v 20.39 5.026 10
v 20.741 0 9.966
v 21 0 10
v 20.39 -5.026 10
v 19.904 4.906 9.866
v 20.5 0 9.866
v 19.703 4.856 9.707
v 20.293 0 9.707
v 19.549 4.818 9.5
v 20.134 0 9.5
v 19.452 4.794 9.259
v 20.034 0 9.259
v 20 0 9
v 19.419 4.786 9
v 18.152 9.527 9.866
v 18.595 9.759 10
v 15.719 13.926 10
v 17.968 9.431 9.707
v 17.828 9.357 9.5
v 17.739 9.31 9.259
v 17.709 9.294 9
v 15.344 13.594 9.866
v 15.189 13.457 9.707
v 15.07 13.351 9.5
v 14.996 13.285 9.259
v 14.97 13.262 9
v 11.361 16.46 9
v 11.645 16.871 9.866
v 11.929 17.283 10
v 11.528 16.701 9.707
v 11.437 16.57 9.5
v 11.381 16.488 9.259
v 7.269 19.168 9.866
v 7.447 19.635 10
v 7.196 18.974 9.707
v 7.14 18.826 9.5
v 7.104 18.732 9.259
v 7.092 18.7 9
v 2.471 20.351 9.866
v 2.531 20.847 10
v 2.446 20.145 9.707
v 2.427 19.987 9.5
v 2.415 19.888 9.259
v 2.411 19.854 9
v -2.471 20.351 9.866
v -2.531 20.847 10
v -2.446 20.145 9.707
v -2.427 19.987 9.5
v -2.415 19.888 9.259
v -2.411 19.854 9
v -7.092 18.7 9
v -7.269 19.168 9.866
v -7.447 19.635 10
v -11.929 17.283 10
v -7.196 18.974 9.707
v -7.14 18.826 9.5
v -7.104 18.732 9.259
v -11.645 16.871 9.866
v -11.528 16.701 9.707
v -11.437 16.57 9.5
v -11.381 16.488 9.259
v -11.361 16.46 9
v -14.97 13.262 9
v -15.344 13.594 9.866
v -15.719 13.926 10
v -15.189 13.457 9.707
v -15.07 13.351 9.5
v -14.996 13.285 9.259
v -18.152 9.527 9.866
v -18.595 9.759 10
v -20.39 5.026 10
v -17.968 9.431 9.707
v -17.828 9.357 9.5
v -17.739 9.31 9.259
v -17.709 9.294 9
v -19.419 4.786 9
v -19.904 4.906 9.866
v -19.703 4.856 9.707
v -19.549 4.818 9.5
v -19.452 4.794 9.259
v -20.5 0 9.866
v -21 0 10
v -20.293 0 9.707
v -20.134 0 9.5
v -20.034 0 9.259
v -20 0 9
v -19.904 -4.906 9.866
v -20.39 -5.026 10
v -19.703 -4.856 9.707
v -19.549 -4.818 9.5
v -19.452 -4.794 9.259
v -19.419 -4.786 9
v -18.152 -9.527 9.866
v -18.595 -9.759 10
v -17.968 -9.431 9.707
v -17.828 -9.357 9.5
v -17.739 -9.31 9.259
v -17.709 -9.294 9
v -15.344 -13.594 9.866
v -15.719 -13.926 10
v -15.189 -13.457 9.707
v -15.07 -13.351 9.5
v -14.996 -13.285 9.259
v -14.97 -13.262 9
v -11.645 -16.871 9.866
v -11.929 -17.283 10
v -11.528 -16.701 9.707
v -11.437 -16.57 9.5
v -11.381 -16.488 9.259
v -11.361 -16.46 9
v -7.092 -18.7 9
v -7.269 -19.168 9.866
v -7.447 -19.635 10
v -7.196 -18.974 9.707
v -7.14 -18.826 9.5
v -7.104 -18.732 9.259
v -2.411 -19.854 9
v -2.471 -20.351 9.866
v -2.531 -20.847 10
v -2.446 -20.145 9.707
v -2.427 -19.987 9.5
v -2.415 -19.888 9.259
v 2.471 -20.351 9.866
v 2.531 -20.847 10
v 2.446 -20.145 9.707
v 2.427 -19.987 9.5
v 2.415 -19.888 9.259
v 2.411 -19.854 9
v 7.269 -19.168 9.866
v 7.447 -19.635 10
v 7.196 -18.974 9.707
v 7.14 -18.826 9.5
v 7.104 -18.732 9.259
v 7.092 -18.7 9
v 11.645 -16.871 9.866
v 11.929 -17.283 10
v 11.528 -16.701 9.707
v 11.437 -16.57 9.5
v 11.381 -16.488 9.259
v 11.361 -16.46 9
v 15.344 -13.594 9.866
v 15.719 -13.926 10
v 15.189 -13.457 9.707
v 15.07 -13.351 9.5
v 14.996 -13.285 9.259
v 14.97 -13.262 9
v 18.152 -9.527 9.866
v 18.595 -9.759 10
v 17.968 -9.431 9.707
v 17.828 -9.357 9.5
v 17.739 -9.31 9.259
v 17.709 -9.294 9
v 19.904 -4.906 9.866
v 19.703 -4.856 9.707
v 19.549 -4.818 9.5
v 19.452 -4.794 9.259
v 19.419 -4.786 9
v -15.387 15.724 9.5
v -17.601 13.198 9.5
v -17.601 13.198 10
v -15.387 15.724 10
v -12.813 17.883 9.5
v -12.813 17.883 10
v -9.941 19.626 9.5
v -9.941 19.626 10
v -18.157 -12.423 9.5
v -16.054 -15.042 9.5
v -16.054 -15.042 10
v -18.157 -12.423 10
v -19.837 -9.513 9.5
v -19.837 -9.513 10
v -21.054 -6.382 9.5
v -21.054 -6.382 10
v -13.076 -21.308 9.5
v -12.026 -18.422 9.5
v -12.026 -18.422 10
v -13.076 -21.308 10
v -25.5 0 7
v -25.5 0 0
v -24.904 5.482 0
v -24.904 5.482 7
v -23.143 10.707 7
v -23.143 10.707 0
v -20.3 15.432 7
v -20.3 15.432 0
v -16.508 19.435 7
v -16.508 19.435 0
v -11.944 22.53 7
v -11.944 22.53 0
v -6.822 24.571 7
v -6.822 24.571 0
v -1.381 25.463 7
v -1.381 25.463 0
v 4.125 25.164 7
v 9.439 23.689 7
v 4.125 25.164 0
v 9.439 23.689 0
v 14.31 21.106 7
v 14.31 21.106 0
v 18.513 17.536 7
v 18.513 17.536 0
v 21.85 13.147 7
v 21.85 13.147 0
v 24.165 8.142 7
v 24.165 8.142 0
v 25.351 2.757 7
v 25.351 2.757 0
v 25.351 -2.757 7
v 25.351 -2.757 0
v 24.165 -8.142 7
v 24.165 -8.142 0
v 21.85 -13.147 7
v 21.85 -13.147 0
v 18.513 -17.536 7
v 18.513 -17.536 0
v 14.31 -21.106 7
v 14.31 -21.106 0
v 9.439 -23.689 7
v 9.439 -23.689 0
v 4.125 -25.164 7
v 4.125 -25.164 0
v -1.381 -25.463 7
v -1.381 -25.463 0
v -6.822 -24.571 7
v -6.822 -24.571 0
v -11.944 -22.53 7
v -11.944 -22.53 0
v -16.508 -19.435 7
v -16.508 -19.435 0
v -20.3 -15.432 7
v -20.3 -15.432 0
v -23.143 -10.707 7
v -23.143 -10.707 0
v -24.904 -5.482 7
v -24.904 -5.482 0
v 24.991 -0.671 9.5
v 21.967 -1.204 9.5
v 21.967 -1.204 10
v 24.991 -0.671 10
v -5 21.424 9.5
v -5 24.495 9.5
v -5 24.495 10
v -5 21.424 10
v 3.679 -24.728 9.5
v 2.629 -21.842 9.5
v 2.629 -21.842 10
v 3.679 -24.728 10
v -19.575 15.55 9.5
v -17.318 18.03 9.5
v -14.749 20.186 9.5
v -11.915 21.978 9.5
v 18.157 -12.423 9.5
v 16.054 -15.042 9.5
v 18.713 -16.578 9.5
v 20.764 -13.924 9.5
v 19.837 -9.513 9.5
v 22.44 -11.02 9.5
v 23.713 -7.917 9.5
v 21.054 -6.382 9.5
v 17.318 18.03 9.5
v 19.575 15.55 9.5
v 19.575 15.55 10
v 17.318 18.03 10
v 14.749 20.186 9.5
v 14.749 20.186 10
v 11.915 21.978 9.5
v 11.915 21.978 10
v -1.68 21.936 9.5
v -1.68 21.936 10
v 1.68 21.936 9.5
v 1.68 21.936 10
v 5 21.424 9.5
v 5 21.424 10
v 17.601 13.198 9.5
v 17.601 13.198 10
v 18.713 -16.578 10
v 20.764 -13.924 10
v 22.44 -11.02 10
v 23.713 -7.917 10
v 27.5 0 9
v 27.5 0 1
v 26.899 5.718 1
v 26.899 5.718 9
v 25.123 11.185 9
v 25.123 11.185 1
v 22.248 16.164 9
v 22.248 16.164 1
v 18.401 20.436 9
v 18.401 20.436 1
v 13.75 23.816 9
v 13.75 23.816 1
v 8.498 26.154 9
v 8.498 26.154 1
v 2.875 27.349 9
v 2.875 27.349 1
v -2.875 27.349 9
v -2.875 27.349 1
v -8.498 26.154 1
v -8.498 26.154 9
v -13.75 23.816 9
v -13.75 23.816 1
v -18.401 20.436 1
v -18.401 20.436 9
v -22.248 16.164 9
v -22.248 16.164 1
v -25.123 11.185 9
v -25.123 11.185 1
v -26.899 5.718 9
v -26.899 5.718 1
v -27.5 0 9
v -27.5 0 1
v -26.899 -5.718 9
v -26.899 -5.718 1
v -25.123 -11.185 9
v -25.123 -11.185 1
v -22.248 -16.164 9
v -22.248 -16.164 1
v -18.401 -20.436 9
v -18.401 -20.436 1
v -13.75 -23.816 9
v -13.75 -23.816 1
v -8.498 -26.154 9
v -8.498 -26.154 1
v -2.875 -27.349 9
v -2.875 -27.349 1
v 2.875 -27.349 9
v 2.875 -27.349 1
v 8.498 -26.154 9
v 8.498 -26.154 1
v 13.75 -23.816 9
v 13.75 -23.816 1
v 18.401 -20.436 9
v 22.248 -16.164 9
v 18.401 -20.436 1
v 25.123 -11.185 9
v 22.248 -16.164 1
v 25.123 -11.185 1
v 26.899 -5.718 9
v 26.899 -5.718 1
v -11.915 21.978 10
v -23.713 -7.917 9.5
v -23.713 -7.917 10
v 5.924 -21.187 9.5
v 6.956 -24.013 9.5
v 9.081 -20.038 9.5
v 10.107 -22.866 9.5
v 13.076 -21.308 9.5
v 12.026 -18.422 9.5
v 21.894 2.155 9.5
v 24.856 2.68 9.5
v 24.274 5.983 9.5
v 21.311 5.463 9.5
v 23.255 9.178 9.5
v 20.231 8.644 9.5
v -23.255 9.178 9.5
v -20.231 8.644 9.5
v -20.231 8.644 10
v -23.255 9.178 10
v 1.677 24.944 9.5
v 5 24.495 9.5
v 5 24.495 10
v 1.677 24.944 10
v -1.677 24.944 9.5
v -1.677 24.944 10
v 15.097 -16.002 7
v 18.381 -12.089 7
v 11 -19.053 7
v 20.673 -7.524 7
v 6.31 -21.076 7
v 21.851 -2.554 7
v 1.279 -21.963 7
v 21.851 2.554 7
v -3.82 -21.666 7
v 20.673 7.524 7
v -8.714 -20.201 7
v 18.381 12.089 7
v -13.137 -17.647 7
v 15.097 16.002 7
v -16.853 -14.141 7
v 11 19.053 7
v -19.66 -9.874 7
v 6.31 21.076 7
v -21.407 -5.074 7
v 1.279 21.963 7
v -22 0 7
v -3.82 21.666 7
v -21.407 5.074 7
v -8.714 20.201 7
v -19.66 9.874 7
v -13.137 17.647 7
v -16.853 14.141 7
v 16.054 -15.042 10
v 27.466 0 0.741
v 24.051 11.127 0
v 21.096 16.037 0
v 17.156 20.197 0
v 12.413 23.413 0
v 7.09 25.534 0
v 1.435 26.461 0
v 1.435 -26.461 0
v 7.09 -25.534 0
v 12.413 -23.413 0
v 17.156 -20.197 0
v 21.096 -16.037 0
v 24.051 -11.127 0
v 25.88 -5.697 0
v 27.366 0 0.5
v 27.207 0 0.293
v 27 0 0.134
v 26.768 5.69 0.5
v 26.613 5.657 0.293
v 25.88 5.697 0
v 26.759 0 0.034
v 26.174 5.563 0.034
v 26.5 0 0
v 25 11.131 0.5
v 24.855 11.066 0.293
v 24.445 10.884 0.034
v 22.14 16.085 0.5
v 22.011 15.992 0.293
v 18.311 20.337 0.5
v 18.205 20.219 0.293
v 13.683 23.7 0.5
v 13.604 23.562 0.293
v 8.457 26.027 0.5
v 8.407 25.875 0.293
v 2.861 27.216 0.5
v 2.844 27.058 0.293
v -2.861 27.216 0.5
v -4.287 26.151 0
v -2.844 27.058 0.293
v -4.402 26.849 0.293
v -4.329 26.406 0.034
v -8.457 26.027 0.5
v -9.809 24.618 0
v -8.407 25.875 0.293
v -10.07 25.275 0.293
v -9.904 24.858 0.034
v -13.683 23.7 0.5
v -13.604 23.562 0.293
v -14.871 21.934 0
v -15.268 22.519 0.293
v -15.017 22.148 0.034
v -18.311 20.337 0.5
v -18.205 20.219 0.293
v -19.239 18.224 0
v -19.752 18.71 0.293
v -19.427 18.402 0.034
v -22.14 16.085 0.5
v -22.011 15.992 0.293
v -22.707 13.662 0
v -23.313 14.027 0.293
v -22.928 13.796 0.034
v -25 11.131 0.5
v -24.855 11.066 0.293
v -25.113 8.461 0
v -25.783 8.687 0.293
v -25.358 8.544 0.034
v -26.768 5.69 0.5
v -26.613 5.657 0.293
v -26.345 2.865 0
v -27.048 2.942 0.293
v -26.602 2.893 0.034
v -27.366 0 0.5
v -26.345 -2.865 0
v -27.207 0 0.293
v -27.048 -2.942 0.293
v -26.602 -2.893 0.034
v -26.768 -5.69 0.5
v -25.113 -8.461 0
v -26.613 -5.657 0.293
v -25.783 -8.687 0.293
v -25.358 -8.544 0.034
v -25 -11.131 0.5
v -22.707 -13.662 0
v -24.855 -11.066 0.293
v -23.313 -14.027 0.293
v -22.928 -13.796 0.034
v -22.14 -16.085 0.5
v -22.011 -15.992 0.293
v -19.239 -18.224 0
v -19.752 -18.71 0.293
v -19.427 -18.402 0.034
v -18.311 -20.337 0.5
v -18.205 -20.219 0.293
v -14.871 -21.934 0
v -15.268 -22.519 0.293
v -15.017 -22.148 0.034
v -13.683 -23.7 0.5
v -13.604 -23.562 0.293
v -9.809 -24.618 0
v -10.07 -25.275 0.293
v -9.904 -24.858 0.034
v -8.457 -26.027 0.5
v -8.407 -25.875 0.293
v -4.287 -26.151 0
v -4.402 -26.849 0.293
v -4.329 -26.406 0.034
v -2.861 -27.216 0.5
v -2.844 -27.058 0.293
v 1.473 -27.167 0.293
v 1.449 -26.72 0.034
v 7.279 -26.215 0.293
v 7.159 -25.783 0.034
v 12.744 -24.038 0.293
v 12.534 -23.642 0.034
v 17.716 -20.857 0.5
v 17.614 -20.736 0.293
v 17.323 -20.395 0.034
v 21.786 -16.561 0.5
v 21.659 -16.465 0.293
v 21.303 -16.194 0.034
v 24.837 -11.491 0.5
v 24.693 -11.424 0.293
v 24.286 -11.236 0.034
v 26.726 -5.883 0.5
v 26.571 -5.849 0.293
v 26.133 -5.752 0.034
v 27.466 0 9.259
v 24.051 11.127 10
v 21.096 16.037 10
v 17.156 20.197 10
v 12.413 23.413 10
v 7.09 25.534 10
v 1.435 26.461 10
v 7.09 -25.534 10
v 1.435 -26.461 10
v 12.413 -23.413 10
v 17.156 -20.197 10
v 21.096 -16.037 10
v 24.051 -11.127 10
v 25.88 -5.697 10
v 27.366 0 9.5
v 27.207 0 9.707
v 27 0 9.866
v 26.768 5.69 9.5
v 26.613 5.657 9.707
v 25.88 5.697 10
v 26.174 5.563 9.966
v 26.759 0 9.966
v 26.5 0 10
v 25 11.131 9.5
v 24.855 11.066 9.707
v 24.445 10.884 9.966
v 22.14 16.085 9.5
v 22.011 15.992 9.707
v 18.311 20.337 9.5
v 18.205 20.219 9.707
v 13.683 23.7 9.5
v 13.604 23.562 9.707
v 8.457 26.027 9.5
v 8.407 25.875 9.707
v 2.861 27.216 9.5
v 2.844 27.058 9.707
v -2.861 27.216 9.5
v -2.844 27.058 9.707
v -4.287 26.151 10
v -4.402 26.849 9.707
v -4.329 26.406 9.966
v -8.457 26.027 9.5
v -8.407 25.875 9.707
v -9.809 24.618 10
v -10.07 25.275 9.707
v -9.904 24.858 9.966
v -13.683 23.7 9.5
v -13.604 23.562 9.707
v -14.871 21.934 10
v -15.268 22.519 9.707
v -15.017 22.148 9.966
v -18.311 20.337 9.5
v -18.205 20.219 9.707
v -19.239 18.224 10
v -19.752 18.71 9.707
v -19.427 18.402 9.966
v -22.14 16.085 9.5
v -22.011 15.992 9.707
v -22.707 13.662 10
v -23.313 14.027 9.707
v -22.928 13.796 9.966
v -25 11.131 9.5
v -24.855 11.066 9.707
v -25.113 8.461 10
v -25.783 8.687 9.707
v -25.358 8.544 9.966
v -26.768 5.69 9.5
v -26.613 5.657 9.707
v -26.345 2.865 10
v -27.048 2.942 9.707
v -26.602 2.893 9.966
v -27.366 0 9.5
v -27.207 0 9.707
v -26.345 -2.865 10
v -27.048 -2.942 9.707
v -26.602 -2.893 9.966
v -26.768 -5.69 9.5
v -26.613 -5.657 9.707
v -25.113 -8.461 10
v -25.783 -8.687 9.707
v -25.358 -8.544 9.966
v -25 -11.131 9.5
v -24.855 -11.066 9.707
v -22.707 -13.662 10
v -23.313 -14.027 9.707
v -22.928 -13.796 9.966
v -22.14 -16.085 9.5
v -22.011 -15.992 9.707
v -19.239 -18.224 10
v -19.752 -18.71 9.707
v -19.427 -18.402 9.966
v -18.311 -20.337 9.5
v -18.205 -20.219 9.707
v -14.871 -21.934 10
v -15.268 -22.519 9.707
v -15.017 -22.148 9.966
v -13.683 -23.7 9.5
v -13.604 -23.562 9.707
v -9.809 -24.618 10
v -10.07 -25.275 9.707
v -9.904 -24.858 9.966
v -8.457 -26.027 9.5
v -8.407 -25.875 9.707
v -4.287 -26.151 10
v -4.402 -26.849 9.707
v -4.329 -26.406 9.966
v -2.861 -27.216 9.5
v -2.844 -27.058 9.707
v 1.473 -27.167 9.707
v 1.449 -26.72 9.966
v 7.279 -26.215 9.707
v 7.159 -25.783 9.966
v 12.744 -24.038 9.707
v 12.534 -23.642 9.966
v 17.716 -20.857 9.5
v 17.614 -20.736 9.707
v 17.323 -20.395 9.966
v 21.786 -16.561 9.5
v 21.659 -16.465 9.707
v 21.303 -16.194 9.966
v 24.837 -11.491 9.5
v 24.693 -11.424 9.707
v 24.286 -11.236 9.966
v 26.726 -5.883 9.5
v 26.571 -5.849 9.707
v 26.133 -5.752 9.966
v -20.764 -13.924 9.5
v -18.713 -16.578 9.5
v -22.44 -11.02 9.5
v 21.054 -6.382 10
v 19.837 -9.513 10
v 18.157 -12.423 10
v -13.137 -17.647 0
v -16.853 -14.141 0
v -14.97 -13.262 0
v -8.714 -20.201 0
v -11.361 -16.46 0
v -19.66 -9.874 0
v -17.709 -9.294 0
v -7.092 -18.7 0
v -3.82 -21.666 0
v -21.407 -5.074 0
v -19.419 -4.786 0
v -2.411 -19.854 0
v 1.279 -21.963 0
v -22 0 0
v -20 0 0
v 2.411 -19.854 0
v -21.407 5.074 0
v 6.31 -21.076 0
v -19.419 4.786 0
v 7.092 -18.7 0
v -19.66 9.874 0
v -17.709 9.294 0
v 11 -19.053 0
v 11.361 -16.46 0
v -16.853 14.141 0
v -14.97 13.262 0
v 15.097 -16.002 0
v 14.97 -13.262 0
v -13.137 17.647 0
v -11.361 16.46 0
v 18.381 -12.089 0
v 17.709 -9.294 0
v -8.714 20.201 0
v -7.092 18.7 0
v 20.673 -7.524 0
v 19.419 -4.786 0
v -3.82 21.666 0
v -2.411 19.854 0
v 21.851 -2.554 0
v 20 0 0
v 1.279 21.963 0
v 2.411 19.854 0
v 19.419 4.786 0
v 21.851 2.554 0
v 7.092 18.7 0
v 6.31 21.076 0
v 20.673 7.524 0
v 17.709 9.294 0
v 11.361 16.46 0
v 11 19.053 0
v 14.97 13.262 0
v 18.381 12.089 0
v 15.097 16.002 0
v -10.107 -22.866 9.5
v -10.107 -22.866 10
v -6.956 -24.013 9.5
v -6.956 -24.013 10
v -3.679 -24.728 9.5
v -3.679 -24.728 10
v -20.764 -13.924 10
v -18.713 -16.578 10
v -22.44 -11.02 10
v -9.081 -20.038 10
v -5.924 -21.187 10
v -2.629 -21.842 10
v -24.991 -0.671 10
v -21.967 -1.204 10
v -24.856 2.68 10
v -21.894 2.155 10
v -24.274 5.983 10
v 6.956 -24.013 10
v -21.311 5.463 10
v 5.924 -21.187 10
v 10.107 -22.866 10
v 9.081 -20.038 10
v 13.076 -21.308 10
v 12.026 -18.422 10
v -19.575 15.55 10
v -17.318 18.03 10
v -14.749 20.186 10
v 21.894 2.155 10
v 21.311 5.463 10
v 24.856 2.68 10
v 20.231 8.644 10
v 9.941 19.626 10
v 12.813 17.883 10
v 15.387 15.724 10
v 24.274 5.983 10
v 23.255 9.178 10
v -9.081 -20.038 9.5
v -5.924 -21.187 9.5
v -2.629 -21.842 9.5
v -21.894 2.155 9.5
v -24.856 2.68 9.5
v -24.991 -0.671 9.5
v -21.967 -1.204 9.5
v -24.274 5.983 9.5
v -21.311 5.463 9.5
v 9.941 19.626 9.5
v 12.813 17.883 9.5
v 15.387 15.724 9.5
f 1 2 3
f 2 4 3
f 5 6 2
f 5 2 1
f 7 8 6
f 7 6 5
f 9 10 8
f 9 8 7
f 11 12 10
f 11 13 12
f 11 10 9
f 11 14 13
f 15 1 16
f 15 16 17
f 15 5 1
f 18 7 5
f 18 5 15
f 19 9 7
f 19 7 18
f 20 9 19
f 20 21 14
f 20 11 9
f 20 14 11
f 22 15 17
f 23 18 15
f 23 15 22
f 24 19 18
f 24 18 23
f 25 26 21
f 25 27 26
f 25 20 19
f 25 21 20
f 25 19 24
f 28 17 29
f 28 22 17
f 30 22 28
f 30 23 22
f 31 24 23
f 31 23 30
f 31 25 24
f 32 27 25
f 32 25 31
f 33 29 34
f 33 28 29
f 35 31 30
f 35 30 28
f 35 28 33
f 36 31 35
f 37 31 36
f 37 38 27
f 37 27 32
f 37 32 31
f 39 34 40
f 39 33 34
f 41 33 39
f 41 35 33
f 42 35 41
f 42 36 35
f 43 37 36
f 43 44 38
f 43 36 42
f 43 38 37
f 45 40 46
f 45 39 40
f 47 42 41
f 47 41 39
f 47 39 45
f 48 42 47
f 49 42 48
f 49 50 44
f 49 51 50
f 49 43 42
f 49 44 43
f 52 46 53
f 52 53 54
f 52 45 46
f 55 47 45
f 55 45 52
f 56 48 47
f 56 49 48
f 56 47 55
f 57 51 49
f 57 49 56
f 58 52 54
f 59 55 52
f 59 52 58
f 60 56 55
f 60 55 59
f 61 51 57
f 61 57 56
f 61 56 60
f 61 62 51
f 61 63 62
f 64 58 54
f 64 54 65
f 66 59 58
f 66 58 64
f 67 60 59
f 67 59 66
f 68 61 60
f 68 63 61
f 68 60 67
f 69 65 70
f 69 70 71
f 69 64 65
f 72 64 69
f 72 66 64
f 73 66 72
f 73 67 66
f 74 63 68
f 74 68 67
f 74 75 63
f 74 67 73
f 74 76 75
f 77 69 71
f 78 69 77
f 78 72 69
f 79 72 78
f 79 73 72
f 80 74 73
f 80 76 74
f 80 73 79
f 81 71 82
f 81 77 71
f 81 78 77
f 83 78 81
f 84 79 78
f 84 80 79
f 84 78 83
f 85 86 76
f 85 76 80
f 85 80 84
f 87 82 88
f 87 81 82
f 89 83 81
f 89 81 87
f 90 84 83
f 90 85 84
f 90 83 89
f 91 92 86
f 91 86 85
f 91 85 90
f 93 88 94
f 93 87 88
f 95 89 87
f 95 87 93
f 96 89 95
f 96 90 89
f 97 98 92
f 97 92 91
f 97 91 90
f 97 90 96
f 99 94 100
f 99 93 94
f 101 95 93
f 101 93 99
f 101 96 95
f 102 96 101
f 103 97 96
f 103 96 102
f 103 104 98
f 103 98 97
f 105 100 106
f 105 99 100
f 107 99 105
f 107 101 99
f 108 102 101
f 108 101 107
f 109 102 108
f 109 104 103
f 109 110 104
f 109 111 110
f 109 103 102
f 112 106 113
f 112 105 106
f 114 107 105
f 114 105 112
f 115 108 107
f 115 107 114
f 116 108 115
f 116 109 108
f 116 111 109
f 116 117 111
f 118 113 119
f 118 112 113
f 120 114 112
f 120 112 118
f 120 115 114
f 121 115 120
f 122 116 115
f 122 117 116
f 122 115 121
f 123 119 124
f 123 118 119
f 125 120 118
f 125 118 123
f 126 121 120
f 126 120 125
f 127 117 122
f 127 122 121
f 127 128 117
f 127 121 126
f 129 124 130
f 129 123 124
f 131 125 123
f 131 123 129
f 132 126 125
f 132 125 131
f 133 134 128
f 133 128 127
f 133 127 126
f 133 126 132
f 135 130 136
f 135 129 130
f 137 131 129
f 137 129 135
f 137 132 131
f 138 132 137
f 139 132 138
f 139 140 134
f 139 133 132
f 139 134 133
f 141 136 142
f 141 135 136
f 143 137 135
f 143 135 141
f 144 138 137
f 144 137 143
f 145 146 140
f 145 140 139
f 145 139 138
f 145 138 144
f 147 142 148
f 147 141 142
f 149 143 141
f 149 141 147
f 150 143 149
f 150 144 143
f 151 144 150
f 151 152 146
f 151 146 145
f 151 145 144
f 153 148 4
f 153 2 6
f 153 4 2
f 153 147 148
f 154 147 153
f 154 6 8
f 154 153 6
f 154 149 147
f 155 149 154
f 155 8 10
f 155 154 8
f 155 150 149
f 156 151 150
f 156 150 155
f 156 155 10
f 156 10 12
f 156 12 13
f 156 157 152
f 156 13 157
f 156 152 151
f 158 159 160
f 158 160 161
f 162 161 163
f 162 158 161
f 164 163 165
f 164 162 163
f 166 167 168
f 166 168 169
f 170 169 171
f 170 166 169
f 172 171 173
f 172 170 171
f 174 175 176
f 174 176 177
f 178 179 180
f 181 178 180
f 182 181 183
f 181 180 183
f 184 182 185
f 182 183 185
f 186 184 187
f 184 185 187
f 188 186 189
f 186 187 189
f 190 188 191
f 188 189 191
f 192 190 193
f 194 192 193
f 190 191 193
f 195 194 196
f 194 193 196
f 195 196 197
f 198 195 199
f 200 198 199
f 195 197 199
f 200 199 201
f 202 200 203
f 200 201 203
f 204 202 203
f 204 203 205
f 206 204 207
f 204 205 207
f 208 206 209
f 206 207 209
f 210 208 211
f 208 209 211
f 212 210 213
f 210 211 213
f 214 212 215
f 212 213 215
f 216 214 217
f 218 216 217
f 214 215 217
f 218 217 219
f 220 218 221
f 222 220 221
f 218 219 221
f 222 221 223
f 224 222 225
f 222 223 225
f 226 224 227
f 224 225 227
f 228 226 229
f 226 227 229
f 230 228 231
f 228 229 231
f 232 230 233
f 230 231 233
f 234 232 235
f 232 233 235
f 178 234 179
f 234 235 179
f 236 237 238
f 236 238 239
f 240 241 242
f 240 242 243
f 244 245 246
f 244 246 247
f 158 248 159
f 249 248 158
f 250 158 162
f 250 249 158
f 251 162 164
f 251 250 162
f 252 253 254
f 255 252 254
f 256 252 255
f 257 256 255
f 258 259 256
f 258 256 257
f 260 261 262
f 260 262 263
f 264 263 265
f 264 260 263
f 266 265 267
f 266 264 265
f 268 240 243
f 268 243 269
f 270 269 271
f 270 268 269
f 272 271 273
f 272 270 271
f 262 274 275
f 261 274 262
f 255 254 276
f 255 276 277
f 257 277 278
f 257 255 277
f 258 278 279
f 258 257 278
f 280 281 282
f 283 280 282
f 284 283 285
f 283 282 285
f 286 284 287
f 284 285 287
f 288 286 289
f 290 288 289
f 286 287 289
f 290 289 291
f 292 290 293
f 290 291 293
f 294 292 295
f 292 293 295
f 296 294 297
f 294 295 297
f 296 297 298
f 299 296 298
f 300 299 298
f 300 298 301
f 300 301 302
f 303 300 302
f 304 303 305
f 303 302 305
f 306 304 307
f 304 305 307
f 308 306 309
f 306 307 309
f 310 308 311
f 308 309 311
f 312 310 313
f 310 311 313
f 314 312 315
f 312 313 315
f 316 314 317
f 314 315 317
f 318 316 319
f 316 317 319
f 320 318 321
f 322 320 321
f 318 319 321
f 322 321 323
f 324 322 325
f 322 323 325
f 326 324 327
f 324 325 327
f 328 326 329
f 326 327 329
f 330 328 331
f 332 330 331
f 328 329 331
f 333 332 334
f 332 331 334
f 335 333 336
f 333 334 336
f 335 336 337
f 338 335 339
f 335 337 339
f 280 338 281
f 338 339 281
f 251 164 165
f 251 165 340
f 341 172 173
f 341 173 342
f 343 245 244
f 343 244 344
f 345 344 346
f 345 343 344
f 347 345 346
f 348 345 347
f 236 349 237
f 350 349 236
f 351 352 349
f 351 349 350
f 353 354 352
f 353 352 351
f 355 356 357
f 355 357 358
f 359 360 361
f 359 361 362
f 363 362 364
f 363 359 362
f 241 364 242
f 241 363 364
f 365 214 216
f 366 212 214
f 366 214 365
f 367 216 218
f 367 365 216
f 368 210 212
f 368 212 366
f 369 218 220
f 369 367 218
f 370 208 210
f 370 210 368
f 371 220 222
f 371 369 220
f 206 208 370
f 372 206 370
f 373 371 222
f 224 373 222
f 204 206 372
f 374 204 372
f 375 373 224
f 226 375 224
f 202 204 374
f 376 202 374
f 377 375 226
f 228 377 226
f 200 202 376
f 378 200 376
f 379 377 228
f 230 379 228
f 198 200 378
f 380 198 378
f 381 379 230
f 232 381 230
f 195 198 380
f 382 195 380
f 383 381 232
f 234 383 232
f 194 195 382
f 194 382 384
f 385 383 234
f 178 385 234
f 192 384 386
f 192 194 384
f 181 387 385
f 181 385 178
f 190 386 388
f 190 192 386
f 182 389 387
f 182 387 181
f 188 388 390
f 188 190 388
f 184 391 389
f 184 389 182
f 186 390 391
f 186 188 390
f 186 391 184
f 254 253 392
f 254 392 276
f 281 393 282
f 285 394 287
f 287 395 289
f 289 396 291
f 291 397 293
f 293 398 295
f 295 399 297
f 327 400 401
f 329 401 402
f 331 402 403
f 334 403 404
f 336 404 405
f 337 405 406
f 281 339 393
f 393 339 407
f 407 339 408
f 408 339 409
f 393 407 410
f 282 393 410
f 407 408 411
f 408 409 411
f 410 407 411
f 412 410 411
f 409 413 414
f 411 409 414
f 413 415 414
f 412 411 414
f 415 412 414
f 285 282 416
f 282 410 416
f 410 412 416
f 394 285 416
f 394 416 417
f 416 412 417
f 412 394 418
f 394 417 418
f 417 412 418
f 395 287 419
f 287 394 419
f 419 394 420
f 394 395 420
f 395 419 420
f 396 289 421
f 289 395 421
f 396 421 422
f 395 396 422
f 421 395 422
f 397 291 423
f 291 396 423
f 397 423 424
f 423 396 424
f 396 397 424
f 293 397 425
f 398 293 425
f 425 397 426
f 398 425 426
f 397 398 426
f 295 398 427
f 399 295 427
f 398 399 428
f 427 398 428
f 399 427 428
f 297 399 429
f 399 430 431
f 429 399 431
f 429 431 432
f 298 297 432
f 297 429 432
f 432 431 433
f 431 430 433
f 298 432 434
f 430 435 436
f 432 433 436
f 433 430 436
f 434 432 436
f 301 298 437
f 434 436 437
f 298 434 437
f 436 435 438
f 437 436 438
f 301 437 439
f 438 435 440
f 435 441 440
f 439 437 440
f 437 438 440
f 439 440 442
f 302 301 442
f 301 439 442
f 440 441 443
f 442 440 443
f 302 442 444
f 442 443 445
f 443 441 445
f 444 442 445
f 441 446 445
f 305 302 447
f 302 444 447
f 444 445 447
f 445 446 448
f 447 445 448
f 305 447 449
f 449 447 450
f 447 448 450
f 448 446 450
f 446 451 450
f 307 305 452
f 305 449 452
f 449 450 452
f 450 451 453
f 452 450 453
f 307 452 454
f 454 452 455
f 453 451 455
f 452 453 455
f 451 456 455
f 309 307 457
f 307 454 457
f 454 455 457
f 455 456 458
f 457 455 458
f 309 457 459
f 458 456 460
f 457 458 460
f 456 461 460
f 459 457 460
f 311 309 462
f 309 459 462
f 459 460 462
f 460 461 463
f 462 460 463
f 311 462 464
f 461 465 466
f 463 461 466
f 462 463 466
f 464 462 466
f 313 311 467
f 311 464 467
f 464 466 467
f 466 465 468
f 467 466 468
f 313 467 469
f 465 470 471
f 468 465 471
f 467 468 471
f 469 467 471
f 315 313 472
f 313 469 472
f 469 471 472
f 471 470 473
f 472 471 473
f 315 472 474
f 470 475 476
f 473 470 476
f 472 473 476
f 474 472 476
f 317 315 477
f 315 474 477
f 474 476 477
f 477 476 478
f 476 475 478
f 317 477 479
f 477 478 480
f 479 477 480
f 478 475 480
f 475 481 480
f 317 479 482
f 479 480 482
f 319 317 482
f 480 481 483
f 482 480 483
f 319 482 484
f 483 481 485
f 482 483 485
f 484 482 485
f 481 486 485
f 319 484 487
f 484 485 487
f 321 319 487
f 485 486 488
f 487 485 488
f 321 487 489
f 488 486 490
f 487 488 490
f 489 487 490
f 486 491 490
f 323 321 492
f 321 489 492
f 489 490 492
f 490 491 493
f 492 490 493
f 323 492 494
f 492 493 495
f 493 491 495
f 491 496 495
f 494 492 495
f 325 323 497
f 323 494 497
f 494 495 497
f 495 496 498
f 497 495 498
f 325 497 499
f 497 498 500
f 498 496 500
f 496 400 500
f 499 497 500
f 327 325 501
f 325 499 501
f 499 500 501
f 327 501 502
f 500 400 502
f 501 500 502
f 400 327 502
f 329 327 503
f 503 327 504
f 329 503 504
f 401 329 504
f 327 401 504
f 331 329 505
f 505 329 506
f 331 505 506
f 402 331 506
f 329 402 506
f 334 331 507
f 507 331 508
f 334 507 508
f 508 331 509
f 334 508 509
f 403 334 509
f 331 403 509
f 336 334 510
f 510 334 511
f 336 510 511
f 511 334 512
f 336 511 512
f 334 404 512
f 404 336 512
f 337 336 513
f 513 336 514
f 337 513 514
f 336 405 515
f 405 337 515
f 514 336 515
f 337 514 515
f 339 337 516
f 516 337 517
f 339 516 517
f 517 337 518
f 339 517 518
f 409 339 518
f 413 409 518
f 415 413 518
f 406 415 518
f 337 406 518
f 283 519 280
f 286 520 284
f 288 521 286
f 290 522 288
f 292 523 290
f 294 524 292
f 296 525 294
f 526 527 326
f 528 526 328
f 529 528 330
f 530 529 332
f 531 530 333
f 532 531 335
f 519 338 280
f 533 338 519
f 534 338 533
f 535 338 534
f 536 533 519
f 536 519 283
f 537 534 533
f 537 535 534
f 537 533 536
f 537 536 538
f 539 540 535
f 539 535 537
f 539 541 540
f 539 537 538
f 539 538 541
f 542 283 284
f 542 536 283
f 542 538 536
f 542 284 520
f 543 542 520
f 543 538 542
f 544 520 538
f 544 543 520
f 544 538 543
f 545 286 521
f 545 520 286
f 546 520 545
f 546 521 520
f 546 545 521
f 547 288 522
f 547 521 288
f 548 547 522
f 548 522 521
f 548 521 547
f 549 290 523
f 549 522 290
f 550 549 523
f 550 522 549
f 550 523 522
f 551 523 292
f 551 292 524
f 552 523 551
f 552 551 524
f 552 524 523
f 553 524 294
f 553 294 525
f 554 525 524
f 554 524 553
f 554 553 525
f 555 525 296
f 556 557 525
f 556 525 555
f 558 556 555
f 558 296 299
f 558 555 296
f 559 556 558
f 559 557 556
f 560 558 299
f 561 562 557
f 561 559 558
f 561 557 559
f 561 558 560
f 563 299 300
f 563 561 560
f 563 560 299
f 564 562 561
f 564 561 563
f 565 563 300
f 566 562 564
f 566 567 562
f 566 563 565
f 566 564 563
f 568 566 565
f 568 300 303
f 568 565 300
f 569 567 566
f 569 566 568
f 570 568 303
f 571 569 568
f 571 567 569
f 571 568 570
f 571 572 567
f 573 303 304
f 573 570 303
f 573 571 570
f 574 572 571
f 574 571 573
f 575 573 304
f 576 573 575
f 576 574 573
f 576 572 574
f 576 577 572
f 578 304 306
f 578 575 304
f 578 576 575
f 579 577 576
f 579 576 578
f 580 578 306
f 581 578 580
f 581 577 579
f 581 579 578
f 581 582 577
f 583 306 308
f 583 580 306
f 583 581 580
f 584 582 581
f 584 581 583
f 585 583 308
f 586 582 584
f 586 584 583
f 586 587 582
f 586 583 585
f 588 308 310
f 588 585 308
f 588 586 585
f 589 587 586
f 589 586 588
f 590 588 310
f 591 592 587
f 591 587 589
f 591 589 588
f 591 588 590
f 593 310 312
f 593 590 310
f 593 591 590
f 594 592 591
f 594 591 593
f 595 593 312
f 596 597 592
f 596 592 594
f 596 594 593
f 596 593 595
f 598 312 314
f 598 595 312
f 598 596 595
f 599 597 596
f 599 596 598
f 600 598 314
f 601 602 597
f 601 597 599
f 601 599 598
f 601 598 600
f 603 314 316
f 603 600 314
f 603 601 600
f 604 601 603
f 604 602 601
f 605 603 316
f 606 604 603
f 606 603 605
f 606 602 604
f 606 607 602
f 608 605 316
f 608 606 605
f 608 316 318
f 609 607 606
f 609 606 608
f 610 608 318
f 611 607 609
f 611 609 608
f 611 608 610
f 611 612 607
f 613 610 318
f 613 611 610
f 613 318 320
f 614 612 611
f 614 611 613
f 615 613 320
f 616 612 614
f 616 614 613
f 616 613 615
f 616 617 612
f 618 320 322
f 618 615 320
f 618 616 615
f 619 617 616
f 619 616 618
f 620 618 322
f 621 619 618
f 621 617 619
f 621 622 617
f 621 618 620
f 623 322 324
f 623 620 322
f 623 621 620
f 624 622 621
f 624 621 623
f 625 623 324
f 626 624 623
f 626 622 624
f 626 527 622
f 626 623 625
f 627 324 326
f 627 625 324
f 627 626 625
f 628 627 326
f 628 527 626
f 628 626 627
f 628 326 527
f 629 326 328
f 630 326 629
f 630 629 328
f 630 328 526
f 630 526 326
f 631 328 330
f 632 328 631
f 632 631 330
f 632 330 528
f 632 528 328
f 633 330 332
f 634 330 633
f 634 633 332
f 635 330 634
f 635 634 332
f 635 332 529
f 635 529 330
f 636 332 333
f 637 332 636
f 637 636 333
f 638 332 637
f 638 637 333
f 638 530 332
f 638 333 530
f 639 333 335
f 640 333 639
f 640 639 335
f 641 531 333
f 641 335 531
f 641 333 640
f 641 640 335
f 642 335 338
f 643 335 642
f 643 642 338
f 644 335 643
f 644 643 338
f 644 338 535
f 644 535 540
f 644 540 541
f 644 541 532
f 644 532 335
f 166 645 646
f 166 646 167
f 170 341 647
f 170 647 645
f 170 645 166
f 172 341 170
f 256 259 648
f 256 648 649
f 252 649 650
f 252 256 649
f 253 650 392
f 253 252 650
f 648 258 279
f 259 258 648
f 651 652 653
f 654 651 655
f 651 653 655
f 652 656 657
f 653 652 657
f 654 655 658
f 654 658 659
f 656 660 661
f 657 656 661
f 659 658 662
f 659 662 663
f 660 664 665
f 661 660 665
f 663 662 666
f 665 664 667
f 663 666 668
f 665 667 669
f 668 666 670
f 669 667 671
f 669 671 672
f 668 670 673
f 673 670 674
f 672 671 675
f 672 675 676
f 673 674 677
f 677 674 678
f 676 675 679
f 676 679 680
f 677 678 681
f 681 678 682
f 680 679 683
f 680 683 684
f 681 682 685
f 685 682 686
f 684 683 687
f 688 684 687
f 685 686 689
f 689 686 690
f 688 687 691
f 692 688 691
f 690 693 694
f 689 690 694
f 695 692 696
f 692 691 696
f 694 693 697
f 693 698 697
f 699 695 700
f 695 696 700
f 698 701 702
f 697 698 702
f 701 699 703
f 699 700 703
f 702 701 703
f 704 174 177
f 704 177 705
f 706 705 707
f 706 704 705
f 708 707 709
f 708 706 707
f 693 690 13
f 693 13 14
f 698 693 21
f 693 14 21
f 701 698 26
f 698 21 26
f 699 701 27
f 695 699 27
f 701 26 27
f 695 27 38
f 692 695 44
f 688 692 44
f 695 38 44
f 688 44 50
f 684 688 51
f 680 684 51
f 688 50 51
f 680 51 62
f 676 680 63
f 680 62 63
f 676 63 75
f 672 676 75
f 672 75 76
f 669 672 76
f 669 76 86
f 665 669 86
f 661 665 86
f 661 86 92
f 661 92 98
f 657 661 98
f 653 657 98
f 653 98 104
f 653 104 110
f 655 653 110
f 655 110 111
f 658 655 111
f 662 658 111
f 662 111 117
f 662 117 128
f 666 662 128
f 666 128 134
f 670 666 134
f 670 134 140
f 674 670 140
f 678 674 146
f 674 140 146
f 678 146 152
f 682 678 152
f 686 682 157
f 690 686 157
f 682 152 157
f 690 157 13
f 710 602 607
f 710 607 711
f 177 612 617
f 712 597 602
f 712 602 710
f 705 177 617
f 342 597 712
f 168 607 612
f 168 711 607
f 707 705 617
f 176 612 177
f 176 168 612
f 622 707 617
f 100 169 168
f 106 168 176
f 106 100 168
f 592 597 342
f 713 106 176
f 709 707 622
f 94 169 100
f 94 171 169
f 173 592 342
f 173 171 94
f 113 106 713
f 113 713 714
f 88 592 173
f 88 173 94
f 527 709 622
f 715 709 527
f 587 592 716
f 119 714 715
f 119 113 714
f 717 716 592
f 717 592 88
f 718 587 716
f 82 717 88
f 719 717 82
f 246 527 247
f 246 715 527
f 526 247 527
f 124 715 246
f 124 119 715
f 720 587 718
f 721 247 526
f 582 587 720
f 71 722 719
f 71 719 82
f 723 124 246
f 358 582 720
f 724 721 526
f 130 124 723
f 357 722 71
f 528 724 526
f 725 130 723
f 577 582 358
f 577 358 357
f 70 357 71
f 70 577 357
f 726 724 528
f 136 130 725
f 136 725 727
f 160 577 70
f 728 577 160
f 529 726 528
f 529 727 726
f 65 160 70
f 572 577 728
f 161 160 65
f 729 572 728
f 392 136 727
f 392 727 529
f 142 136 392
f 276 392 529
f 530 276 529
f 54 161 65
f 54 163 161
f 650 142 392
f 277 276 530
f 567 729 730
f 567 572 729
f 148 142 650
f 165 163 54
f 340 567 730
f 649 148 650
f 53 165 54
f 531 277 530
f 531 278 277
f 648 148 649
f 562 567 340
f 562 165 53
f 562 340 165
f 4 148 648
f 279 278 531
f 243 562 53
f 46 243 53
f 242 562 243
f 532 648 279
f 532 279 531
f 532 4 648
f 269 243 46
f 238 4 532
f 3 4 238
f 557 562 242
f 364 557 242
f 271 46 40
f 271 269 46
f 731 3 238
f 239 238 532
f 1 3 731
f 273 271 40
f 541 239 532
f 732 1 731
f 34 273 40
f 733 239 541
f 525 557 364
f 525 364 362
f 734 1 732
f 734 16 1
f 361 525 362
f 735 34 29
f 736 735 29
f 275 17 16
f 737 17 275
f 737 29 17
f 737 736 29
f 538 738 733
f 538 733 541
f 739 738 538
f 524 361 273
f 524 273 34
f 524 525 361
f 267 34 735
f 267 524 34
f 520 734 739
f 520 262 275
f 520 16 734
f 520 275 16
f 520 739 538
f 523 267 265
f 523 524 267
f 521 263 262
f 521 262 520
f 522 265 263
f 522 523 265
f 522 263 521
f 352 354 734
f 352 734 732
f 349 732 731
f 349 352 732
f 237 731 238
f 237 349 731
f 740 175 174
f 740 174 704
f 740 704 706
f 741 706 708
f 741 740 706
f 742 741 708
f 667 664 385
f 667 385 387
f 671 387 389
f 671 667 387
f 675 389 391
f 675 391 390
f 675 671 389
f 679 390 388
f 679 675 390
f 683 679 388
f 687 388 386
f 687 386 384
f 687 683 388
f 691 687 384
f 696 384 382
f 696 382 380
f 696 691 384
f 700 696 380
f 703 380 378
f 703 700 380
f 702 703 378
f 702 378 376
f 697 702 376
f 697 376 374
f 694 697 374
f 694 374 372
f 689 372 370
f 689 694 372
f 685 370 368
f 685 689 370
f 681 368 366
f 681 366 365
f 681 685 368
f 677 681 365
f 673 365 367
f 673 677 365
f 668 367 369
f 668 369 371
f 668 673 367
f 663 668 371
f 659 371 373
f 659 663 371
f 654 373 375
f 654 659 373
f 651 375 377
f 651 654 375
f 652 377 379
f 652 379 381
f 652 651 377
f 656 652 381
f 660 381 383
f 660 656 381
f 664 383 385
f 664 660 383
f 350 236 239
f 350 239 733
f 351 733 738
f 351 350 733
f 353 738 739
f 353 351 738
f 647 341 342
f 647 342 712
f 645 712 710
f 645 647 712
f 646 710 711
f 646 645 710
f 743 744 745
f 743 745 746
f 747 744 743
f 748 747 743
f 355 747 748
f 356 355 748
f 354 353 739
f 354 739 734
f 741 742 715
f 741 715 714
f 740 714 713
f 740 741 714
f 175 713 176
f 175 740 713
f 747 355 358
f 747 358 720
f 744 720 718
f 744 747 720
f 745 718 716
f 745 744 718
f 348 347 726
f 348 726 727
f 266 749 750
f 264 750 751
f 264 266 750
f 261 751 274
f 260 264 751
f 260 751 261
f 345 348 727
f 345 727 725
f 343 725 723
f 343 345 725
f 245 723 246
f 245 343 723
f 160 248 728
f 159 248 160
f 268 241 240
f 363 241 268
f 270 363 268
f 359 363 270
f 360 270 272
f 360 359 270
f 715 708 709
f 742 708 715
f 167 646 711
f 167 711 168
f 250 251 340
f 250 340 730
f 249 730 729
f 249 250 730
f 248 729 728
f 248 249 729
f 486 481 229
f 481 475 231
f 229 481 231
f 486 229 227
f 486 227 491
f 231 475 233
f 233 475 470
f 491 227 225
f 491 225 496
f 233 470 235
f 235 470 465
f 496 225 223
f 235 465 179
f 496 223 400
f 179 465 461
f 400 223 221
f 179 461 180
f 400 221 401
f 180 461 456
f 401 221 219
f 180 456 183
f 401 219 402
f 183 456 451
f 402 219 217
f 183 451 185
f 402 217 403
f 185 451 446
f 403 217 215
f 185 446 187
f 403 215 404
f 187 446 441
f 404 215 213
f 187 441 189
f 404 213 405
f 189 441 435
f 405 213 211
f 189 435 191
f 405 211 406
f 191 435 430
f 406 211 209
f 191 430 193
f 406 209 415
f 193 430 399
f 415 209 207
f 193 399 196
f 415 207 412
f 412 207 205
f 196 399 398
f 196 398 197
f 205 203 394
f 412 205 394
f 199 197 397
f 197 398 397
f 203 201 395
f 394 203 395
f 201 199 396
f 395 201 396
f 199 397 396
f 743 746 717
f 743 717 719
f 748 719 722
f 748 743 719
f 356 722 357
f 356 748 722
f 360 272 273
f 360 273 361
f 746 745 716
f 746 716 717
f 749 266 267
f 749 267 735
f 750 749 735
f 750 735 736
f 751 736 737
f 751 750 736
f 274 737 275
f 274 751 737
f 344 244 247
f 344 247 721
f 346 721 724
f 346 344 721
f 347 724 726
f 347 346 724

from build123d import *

# Parameters (mm, degrees)
SKETCH_1_R          = 27.5
EXTRUDE_1_DEPTH     = 10
SKETCH_2_R          = 20
CUT_EXTRUDE_1_DEPTH = 20
SKETCH_3_R          = 25.5
SKETCH_3_R_2        = 22
CUT_EXTRUDE_2_DEPTH = 7
FILLET_1_R          = 1
CUT_EXTRUDE_START   = -0.5
CUT_EXTRUDE_3_DEPTH = 0.5
FILLET_2_R          = 1


with BuildPart() as part:
    # 草图1 → 拉伸1 (new body)
    with BuildSketch(Plane.XY):
        Circle(SKETCH_1_R)
    extrude(amount=EXTRUDE_1_DEPTH)

    # 草图2 → 切除-拉伸1 (cut)
    with BuildSketch(Plane.XY.offset(10)):
        Circle(SKETCH_2_R)
    extrude(amount=-CUT_EXTRUDE_1_DEPTH, mode=Mode.SUBTRACT)

    # 草图3 → 切除-拉伸2 (cut)
    with BuildSketch(Plane(origin=(0, 0, 0), x_dir=(-1, 0, 0), z_dir=(0, 0, -1))):
        Circle(SKETCH_3_R)
        Circle(SKETCH_3_R_2, mode=Mode.SUBTRACT)
    extrude(amount=-CUT_EXTRUDE_2_DEPTH, mode=Mode.SUBTRACT)

    # 圆角1
    fillet_1_edges = [part.edges().sort_by_distance(p)[0] for p in [
        (-27.5, 0, 0),
        (-27.5, 0, 10),
    ]]
    fillet(fillet_1_edges, radius=FILLET_1_R)

    # 草图4 → 切除-拉伸3 (cut)
    with BuildSketch(Plane.XY.offset(10).offset(CUT_EXTRUDE_START)):
        with BuildLine():
            Line((17.601487344, 13.198016642), (19.575238783, 15.550242011))
            ThreePointArc((19.575238783, 15.550242011), (16.069690242, 19.151111078), (11.914794352, 21.978118108))
            Line((11.914794352, 21.978118108), (9.941042912, 19.625892739))
            ThreePointArc((9.941042912, 19.625892739), (14.141327413, 16.852977749), (17.601487344, 13.198016642))
        make_face()
        with BuildLine():
            Line((5, 21.424285286), (5, 24.494897428))
            ThreePointArc((5, 24.494897428), (0, 25), (-5, 24.494897428))
            Line((-5, 24.494897428), (-5, 21.424285286))
            ThreePointArc((-5, 21.424285286), (0, 22), (5, 21.424285286))
        make_face()
        with BuildLine():
            Line((21.96704314, -1.203750667), (24.991005785, -0.670544465))
            ThreePointArc((24.991005785, -0.670544465), (24.620193825, 4.341204442), (23.254524008, 9.177533066))
            Line((23.254524008, 9.177533066), (20.230561364, 8.644326863))
            ThreePointArc((20.230561364, 8.644326863), (21.665770566, 3.820259909), (21.96704314, -1.203750667))
        make_face()
        with BuildLine():
            Line((16.053975315, -15.042269662), (18.713203436, -16.577575733))
            ThreePointArc((18.713203436, -16.577575733), (21.650635095, -12.5), (23.713203436, -7.917321695))
            Line((23.713203436, -7.917321695), (21.053975315, -6.382015624))
            ThreePointArc((21.053975315, -6.382015624), (19.052558883, -11), (16.053975315, -15.042269662))
        make_face()
        with BuildLine():
            Line((2.62907402, -21.842343505), (3.679285225, -24.727775076))
            ThreePointArc((3.679285225, -24.727775076), (8.550503583, -23.49231552), (13.076211433, -21.307573643))
            Line((13.076211433, -21.307573643), (12.026000228, -18.422142072))
            ThreePointArc((12.026000228, -18.422142072), (7.524443153, -20.673237657), (2.62907402, -21.842343505))
        make_face()
        with BuildLine():
            Line((-12.026000228, -18.422142072), (-13.076211433, -21.307573643))
            ThreePointArc((-13.076211433, -21.307573643), (-8.550503583, -23.49231552), (-3.679285225, -24.727775076))
            Line((-3.679285225, -24.727775076), (-2.62907402, -21.842343505))
            ThreePointArc((-2.62907402, -21.842343505), (-7.524443153, -20.673237657), (-12.026000228, -18.422142072))
        make_face()
        with BuildLine():
            Line((-21.053975315, -6.382015624), (-23.713203436, -7.917321695))
            ThreePointArc((-23.713203436, -7.917321695), (-21.650635095, -12.5), (-18.713203436, -16.577575733))
            Line((-18.713203436, -16.577575733), (-16.053975315, -15.042269662))
            ThreePointArc((-16.053975315, -15.042269662), (-19.052558883, -11), (-21.053975315, -6.382015624))
        make_face()
        with BuildLine():
            Line((-20.230561364, 8.644326863), (-23.254524008, 9.177533066))
            ThreePointArc((-23.254524008, 9.177533066), (-24.620193825, 4.341204442), (-24.991005785, -0.670544465))
            Line((-24.991005785, -0.670544465), (-21.96704314, -1.203750667))
            ThreePointArc((-21.96704314, -1.203750667), (-21.665770566, 3.820259909), (-20.230561364, 8.644326863))
        make_face()
        with BuildLine():
            Line((-9.941042912, 19.625892739), (-11.914794352, 21.978118108))
            ThreePointArc((-11.914794352, 21.978118108), (-16.069690242, 19.151111078), (-19.575238783, 15.550242011))
            Line((-19.575238783, 15.550242011), (-17.601487344, 13.198016642))
            ThreePointArc((-17.601487344, 13.198016642), (-14.141327413, 16.852977749), (-9.941042912, 19.625892739))
        make_face()
    extrude(amount=CUT_EXTRUDE_3_DEPTH, mode=Mode.SUBTRACT)

    # 圆角2
    fillet_2_edges = [part.edges().sort_by_distance(p)[0] for p in [
        (-20, 0, 10),
    ]]
    fillet(fillet_2_edges, radius=FILLET_2_R)


solid = part.part
